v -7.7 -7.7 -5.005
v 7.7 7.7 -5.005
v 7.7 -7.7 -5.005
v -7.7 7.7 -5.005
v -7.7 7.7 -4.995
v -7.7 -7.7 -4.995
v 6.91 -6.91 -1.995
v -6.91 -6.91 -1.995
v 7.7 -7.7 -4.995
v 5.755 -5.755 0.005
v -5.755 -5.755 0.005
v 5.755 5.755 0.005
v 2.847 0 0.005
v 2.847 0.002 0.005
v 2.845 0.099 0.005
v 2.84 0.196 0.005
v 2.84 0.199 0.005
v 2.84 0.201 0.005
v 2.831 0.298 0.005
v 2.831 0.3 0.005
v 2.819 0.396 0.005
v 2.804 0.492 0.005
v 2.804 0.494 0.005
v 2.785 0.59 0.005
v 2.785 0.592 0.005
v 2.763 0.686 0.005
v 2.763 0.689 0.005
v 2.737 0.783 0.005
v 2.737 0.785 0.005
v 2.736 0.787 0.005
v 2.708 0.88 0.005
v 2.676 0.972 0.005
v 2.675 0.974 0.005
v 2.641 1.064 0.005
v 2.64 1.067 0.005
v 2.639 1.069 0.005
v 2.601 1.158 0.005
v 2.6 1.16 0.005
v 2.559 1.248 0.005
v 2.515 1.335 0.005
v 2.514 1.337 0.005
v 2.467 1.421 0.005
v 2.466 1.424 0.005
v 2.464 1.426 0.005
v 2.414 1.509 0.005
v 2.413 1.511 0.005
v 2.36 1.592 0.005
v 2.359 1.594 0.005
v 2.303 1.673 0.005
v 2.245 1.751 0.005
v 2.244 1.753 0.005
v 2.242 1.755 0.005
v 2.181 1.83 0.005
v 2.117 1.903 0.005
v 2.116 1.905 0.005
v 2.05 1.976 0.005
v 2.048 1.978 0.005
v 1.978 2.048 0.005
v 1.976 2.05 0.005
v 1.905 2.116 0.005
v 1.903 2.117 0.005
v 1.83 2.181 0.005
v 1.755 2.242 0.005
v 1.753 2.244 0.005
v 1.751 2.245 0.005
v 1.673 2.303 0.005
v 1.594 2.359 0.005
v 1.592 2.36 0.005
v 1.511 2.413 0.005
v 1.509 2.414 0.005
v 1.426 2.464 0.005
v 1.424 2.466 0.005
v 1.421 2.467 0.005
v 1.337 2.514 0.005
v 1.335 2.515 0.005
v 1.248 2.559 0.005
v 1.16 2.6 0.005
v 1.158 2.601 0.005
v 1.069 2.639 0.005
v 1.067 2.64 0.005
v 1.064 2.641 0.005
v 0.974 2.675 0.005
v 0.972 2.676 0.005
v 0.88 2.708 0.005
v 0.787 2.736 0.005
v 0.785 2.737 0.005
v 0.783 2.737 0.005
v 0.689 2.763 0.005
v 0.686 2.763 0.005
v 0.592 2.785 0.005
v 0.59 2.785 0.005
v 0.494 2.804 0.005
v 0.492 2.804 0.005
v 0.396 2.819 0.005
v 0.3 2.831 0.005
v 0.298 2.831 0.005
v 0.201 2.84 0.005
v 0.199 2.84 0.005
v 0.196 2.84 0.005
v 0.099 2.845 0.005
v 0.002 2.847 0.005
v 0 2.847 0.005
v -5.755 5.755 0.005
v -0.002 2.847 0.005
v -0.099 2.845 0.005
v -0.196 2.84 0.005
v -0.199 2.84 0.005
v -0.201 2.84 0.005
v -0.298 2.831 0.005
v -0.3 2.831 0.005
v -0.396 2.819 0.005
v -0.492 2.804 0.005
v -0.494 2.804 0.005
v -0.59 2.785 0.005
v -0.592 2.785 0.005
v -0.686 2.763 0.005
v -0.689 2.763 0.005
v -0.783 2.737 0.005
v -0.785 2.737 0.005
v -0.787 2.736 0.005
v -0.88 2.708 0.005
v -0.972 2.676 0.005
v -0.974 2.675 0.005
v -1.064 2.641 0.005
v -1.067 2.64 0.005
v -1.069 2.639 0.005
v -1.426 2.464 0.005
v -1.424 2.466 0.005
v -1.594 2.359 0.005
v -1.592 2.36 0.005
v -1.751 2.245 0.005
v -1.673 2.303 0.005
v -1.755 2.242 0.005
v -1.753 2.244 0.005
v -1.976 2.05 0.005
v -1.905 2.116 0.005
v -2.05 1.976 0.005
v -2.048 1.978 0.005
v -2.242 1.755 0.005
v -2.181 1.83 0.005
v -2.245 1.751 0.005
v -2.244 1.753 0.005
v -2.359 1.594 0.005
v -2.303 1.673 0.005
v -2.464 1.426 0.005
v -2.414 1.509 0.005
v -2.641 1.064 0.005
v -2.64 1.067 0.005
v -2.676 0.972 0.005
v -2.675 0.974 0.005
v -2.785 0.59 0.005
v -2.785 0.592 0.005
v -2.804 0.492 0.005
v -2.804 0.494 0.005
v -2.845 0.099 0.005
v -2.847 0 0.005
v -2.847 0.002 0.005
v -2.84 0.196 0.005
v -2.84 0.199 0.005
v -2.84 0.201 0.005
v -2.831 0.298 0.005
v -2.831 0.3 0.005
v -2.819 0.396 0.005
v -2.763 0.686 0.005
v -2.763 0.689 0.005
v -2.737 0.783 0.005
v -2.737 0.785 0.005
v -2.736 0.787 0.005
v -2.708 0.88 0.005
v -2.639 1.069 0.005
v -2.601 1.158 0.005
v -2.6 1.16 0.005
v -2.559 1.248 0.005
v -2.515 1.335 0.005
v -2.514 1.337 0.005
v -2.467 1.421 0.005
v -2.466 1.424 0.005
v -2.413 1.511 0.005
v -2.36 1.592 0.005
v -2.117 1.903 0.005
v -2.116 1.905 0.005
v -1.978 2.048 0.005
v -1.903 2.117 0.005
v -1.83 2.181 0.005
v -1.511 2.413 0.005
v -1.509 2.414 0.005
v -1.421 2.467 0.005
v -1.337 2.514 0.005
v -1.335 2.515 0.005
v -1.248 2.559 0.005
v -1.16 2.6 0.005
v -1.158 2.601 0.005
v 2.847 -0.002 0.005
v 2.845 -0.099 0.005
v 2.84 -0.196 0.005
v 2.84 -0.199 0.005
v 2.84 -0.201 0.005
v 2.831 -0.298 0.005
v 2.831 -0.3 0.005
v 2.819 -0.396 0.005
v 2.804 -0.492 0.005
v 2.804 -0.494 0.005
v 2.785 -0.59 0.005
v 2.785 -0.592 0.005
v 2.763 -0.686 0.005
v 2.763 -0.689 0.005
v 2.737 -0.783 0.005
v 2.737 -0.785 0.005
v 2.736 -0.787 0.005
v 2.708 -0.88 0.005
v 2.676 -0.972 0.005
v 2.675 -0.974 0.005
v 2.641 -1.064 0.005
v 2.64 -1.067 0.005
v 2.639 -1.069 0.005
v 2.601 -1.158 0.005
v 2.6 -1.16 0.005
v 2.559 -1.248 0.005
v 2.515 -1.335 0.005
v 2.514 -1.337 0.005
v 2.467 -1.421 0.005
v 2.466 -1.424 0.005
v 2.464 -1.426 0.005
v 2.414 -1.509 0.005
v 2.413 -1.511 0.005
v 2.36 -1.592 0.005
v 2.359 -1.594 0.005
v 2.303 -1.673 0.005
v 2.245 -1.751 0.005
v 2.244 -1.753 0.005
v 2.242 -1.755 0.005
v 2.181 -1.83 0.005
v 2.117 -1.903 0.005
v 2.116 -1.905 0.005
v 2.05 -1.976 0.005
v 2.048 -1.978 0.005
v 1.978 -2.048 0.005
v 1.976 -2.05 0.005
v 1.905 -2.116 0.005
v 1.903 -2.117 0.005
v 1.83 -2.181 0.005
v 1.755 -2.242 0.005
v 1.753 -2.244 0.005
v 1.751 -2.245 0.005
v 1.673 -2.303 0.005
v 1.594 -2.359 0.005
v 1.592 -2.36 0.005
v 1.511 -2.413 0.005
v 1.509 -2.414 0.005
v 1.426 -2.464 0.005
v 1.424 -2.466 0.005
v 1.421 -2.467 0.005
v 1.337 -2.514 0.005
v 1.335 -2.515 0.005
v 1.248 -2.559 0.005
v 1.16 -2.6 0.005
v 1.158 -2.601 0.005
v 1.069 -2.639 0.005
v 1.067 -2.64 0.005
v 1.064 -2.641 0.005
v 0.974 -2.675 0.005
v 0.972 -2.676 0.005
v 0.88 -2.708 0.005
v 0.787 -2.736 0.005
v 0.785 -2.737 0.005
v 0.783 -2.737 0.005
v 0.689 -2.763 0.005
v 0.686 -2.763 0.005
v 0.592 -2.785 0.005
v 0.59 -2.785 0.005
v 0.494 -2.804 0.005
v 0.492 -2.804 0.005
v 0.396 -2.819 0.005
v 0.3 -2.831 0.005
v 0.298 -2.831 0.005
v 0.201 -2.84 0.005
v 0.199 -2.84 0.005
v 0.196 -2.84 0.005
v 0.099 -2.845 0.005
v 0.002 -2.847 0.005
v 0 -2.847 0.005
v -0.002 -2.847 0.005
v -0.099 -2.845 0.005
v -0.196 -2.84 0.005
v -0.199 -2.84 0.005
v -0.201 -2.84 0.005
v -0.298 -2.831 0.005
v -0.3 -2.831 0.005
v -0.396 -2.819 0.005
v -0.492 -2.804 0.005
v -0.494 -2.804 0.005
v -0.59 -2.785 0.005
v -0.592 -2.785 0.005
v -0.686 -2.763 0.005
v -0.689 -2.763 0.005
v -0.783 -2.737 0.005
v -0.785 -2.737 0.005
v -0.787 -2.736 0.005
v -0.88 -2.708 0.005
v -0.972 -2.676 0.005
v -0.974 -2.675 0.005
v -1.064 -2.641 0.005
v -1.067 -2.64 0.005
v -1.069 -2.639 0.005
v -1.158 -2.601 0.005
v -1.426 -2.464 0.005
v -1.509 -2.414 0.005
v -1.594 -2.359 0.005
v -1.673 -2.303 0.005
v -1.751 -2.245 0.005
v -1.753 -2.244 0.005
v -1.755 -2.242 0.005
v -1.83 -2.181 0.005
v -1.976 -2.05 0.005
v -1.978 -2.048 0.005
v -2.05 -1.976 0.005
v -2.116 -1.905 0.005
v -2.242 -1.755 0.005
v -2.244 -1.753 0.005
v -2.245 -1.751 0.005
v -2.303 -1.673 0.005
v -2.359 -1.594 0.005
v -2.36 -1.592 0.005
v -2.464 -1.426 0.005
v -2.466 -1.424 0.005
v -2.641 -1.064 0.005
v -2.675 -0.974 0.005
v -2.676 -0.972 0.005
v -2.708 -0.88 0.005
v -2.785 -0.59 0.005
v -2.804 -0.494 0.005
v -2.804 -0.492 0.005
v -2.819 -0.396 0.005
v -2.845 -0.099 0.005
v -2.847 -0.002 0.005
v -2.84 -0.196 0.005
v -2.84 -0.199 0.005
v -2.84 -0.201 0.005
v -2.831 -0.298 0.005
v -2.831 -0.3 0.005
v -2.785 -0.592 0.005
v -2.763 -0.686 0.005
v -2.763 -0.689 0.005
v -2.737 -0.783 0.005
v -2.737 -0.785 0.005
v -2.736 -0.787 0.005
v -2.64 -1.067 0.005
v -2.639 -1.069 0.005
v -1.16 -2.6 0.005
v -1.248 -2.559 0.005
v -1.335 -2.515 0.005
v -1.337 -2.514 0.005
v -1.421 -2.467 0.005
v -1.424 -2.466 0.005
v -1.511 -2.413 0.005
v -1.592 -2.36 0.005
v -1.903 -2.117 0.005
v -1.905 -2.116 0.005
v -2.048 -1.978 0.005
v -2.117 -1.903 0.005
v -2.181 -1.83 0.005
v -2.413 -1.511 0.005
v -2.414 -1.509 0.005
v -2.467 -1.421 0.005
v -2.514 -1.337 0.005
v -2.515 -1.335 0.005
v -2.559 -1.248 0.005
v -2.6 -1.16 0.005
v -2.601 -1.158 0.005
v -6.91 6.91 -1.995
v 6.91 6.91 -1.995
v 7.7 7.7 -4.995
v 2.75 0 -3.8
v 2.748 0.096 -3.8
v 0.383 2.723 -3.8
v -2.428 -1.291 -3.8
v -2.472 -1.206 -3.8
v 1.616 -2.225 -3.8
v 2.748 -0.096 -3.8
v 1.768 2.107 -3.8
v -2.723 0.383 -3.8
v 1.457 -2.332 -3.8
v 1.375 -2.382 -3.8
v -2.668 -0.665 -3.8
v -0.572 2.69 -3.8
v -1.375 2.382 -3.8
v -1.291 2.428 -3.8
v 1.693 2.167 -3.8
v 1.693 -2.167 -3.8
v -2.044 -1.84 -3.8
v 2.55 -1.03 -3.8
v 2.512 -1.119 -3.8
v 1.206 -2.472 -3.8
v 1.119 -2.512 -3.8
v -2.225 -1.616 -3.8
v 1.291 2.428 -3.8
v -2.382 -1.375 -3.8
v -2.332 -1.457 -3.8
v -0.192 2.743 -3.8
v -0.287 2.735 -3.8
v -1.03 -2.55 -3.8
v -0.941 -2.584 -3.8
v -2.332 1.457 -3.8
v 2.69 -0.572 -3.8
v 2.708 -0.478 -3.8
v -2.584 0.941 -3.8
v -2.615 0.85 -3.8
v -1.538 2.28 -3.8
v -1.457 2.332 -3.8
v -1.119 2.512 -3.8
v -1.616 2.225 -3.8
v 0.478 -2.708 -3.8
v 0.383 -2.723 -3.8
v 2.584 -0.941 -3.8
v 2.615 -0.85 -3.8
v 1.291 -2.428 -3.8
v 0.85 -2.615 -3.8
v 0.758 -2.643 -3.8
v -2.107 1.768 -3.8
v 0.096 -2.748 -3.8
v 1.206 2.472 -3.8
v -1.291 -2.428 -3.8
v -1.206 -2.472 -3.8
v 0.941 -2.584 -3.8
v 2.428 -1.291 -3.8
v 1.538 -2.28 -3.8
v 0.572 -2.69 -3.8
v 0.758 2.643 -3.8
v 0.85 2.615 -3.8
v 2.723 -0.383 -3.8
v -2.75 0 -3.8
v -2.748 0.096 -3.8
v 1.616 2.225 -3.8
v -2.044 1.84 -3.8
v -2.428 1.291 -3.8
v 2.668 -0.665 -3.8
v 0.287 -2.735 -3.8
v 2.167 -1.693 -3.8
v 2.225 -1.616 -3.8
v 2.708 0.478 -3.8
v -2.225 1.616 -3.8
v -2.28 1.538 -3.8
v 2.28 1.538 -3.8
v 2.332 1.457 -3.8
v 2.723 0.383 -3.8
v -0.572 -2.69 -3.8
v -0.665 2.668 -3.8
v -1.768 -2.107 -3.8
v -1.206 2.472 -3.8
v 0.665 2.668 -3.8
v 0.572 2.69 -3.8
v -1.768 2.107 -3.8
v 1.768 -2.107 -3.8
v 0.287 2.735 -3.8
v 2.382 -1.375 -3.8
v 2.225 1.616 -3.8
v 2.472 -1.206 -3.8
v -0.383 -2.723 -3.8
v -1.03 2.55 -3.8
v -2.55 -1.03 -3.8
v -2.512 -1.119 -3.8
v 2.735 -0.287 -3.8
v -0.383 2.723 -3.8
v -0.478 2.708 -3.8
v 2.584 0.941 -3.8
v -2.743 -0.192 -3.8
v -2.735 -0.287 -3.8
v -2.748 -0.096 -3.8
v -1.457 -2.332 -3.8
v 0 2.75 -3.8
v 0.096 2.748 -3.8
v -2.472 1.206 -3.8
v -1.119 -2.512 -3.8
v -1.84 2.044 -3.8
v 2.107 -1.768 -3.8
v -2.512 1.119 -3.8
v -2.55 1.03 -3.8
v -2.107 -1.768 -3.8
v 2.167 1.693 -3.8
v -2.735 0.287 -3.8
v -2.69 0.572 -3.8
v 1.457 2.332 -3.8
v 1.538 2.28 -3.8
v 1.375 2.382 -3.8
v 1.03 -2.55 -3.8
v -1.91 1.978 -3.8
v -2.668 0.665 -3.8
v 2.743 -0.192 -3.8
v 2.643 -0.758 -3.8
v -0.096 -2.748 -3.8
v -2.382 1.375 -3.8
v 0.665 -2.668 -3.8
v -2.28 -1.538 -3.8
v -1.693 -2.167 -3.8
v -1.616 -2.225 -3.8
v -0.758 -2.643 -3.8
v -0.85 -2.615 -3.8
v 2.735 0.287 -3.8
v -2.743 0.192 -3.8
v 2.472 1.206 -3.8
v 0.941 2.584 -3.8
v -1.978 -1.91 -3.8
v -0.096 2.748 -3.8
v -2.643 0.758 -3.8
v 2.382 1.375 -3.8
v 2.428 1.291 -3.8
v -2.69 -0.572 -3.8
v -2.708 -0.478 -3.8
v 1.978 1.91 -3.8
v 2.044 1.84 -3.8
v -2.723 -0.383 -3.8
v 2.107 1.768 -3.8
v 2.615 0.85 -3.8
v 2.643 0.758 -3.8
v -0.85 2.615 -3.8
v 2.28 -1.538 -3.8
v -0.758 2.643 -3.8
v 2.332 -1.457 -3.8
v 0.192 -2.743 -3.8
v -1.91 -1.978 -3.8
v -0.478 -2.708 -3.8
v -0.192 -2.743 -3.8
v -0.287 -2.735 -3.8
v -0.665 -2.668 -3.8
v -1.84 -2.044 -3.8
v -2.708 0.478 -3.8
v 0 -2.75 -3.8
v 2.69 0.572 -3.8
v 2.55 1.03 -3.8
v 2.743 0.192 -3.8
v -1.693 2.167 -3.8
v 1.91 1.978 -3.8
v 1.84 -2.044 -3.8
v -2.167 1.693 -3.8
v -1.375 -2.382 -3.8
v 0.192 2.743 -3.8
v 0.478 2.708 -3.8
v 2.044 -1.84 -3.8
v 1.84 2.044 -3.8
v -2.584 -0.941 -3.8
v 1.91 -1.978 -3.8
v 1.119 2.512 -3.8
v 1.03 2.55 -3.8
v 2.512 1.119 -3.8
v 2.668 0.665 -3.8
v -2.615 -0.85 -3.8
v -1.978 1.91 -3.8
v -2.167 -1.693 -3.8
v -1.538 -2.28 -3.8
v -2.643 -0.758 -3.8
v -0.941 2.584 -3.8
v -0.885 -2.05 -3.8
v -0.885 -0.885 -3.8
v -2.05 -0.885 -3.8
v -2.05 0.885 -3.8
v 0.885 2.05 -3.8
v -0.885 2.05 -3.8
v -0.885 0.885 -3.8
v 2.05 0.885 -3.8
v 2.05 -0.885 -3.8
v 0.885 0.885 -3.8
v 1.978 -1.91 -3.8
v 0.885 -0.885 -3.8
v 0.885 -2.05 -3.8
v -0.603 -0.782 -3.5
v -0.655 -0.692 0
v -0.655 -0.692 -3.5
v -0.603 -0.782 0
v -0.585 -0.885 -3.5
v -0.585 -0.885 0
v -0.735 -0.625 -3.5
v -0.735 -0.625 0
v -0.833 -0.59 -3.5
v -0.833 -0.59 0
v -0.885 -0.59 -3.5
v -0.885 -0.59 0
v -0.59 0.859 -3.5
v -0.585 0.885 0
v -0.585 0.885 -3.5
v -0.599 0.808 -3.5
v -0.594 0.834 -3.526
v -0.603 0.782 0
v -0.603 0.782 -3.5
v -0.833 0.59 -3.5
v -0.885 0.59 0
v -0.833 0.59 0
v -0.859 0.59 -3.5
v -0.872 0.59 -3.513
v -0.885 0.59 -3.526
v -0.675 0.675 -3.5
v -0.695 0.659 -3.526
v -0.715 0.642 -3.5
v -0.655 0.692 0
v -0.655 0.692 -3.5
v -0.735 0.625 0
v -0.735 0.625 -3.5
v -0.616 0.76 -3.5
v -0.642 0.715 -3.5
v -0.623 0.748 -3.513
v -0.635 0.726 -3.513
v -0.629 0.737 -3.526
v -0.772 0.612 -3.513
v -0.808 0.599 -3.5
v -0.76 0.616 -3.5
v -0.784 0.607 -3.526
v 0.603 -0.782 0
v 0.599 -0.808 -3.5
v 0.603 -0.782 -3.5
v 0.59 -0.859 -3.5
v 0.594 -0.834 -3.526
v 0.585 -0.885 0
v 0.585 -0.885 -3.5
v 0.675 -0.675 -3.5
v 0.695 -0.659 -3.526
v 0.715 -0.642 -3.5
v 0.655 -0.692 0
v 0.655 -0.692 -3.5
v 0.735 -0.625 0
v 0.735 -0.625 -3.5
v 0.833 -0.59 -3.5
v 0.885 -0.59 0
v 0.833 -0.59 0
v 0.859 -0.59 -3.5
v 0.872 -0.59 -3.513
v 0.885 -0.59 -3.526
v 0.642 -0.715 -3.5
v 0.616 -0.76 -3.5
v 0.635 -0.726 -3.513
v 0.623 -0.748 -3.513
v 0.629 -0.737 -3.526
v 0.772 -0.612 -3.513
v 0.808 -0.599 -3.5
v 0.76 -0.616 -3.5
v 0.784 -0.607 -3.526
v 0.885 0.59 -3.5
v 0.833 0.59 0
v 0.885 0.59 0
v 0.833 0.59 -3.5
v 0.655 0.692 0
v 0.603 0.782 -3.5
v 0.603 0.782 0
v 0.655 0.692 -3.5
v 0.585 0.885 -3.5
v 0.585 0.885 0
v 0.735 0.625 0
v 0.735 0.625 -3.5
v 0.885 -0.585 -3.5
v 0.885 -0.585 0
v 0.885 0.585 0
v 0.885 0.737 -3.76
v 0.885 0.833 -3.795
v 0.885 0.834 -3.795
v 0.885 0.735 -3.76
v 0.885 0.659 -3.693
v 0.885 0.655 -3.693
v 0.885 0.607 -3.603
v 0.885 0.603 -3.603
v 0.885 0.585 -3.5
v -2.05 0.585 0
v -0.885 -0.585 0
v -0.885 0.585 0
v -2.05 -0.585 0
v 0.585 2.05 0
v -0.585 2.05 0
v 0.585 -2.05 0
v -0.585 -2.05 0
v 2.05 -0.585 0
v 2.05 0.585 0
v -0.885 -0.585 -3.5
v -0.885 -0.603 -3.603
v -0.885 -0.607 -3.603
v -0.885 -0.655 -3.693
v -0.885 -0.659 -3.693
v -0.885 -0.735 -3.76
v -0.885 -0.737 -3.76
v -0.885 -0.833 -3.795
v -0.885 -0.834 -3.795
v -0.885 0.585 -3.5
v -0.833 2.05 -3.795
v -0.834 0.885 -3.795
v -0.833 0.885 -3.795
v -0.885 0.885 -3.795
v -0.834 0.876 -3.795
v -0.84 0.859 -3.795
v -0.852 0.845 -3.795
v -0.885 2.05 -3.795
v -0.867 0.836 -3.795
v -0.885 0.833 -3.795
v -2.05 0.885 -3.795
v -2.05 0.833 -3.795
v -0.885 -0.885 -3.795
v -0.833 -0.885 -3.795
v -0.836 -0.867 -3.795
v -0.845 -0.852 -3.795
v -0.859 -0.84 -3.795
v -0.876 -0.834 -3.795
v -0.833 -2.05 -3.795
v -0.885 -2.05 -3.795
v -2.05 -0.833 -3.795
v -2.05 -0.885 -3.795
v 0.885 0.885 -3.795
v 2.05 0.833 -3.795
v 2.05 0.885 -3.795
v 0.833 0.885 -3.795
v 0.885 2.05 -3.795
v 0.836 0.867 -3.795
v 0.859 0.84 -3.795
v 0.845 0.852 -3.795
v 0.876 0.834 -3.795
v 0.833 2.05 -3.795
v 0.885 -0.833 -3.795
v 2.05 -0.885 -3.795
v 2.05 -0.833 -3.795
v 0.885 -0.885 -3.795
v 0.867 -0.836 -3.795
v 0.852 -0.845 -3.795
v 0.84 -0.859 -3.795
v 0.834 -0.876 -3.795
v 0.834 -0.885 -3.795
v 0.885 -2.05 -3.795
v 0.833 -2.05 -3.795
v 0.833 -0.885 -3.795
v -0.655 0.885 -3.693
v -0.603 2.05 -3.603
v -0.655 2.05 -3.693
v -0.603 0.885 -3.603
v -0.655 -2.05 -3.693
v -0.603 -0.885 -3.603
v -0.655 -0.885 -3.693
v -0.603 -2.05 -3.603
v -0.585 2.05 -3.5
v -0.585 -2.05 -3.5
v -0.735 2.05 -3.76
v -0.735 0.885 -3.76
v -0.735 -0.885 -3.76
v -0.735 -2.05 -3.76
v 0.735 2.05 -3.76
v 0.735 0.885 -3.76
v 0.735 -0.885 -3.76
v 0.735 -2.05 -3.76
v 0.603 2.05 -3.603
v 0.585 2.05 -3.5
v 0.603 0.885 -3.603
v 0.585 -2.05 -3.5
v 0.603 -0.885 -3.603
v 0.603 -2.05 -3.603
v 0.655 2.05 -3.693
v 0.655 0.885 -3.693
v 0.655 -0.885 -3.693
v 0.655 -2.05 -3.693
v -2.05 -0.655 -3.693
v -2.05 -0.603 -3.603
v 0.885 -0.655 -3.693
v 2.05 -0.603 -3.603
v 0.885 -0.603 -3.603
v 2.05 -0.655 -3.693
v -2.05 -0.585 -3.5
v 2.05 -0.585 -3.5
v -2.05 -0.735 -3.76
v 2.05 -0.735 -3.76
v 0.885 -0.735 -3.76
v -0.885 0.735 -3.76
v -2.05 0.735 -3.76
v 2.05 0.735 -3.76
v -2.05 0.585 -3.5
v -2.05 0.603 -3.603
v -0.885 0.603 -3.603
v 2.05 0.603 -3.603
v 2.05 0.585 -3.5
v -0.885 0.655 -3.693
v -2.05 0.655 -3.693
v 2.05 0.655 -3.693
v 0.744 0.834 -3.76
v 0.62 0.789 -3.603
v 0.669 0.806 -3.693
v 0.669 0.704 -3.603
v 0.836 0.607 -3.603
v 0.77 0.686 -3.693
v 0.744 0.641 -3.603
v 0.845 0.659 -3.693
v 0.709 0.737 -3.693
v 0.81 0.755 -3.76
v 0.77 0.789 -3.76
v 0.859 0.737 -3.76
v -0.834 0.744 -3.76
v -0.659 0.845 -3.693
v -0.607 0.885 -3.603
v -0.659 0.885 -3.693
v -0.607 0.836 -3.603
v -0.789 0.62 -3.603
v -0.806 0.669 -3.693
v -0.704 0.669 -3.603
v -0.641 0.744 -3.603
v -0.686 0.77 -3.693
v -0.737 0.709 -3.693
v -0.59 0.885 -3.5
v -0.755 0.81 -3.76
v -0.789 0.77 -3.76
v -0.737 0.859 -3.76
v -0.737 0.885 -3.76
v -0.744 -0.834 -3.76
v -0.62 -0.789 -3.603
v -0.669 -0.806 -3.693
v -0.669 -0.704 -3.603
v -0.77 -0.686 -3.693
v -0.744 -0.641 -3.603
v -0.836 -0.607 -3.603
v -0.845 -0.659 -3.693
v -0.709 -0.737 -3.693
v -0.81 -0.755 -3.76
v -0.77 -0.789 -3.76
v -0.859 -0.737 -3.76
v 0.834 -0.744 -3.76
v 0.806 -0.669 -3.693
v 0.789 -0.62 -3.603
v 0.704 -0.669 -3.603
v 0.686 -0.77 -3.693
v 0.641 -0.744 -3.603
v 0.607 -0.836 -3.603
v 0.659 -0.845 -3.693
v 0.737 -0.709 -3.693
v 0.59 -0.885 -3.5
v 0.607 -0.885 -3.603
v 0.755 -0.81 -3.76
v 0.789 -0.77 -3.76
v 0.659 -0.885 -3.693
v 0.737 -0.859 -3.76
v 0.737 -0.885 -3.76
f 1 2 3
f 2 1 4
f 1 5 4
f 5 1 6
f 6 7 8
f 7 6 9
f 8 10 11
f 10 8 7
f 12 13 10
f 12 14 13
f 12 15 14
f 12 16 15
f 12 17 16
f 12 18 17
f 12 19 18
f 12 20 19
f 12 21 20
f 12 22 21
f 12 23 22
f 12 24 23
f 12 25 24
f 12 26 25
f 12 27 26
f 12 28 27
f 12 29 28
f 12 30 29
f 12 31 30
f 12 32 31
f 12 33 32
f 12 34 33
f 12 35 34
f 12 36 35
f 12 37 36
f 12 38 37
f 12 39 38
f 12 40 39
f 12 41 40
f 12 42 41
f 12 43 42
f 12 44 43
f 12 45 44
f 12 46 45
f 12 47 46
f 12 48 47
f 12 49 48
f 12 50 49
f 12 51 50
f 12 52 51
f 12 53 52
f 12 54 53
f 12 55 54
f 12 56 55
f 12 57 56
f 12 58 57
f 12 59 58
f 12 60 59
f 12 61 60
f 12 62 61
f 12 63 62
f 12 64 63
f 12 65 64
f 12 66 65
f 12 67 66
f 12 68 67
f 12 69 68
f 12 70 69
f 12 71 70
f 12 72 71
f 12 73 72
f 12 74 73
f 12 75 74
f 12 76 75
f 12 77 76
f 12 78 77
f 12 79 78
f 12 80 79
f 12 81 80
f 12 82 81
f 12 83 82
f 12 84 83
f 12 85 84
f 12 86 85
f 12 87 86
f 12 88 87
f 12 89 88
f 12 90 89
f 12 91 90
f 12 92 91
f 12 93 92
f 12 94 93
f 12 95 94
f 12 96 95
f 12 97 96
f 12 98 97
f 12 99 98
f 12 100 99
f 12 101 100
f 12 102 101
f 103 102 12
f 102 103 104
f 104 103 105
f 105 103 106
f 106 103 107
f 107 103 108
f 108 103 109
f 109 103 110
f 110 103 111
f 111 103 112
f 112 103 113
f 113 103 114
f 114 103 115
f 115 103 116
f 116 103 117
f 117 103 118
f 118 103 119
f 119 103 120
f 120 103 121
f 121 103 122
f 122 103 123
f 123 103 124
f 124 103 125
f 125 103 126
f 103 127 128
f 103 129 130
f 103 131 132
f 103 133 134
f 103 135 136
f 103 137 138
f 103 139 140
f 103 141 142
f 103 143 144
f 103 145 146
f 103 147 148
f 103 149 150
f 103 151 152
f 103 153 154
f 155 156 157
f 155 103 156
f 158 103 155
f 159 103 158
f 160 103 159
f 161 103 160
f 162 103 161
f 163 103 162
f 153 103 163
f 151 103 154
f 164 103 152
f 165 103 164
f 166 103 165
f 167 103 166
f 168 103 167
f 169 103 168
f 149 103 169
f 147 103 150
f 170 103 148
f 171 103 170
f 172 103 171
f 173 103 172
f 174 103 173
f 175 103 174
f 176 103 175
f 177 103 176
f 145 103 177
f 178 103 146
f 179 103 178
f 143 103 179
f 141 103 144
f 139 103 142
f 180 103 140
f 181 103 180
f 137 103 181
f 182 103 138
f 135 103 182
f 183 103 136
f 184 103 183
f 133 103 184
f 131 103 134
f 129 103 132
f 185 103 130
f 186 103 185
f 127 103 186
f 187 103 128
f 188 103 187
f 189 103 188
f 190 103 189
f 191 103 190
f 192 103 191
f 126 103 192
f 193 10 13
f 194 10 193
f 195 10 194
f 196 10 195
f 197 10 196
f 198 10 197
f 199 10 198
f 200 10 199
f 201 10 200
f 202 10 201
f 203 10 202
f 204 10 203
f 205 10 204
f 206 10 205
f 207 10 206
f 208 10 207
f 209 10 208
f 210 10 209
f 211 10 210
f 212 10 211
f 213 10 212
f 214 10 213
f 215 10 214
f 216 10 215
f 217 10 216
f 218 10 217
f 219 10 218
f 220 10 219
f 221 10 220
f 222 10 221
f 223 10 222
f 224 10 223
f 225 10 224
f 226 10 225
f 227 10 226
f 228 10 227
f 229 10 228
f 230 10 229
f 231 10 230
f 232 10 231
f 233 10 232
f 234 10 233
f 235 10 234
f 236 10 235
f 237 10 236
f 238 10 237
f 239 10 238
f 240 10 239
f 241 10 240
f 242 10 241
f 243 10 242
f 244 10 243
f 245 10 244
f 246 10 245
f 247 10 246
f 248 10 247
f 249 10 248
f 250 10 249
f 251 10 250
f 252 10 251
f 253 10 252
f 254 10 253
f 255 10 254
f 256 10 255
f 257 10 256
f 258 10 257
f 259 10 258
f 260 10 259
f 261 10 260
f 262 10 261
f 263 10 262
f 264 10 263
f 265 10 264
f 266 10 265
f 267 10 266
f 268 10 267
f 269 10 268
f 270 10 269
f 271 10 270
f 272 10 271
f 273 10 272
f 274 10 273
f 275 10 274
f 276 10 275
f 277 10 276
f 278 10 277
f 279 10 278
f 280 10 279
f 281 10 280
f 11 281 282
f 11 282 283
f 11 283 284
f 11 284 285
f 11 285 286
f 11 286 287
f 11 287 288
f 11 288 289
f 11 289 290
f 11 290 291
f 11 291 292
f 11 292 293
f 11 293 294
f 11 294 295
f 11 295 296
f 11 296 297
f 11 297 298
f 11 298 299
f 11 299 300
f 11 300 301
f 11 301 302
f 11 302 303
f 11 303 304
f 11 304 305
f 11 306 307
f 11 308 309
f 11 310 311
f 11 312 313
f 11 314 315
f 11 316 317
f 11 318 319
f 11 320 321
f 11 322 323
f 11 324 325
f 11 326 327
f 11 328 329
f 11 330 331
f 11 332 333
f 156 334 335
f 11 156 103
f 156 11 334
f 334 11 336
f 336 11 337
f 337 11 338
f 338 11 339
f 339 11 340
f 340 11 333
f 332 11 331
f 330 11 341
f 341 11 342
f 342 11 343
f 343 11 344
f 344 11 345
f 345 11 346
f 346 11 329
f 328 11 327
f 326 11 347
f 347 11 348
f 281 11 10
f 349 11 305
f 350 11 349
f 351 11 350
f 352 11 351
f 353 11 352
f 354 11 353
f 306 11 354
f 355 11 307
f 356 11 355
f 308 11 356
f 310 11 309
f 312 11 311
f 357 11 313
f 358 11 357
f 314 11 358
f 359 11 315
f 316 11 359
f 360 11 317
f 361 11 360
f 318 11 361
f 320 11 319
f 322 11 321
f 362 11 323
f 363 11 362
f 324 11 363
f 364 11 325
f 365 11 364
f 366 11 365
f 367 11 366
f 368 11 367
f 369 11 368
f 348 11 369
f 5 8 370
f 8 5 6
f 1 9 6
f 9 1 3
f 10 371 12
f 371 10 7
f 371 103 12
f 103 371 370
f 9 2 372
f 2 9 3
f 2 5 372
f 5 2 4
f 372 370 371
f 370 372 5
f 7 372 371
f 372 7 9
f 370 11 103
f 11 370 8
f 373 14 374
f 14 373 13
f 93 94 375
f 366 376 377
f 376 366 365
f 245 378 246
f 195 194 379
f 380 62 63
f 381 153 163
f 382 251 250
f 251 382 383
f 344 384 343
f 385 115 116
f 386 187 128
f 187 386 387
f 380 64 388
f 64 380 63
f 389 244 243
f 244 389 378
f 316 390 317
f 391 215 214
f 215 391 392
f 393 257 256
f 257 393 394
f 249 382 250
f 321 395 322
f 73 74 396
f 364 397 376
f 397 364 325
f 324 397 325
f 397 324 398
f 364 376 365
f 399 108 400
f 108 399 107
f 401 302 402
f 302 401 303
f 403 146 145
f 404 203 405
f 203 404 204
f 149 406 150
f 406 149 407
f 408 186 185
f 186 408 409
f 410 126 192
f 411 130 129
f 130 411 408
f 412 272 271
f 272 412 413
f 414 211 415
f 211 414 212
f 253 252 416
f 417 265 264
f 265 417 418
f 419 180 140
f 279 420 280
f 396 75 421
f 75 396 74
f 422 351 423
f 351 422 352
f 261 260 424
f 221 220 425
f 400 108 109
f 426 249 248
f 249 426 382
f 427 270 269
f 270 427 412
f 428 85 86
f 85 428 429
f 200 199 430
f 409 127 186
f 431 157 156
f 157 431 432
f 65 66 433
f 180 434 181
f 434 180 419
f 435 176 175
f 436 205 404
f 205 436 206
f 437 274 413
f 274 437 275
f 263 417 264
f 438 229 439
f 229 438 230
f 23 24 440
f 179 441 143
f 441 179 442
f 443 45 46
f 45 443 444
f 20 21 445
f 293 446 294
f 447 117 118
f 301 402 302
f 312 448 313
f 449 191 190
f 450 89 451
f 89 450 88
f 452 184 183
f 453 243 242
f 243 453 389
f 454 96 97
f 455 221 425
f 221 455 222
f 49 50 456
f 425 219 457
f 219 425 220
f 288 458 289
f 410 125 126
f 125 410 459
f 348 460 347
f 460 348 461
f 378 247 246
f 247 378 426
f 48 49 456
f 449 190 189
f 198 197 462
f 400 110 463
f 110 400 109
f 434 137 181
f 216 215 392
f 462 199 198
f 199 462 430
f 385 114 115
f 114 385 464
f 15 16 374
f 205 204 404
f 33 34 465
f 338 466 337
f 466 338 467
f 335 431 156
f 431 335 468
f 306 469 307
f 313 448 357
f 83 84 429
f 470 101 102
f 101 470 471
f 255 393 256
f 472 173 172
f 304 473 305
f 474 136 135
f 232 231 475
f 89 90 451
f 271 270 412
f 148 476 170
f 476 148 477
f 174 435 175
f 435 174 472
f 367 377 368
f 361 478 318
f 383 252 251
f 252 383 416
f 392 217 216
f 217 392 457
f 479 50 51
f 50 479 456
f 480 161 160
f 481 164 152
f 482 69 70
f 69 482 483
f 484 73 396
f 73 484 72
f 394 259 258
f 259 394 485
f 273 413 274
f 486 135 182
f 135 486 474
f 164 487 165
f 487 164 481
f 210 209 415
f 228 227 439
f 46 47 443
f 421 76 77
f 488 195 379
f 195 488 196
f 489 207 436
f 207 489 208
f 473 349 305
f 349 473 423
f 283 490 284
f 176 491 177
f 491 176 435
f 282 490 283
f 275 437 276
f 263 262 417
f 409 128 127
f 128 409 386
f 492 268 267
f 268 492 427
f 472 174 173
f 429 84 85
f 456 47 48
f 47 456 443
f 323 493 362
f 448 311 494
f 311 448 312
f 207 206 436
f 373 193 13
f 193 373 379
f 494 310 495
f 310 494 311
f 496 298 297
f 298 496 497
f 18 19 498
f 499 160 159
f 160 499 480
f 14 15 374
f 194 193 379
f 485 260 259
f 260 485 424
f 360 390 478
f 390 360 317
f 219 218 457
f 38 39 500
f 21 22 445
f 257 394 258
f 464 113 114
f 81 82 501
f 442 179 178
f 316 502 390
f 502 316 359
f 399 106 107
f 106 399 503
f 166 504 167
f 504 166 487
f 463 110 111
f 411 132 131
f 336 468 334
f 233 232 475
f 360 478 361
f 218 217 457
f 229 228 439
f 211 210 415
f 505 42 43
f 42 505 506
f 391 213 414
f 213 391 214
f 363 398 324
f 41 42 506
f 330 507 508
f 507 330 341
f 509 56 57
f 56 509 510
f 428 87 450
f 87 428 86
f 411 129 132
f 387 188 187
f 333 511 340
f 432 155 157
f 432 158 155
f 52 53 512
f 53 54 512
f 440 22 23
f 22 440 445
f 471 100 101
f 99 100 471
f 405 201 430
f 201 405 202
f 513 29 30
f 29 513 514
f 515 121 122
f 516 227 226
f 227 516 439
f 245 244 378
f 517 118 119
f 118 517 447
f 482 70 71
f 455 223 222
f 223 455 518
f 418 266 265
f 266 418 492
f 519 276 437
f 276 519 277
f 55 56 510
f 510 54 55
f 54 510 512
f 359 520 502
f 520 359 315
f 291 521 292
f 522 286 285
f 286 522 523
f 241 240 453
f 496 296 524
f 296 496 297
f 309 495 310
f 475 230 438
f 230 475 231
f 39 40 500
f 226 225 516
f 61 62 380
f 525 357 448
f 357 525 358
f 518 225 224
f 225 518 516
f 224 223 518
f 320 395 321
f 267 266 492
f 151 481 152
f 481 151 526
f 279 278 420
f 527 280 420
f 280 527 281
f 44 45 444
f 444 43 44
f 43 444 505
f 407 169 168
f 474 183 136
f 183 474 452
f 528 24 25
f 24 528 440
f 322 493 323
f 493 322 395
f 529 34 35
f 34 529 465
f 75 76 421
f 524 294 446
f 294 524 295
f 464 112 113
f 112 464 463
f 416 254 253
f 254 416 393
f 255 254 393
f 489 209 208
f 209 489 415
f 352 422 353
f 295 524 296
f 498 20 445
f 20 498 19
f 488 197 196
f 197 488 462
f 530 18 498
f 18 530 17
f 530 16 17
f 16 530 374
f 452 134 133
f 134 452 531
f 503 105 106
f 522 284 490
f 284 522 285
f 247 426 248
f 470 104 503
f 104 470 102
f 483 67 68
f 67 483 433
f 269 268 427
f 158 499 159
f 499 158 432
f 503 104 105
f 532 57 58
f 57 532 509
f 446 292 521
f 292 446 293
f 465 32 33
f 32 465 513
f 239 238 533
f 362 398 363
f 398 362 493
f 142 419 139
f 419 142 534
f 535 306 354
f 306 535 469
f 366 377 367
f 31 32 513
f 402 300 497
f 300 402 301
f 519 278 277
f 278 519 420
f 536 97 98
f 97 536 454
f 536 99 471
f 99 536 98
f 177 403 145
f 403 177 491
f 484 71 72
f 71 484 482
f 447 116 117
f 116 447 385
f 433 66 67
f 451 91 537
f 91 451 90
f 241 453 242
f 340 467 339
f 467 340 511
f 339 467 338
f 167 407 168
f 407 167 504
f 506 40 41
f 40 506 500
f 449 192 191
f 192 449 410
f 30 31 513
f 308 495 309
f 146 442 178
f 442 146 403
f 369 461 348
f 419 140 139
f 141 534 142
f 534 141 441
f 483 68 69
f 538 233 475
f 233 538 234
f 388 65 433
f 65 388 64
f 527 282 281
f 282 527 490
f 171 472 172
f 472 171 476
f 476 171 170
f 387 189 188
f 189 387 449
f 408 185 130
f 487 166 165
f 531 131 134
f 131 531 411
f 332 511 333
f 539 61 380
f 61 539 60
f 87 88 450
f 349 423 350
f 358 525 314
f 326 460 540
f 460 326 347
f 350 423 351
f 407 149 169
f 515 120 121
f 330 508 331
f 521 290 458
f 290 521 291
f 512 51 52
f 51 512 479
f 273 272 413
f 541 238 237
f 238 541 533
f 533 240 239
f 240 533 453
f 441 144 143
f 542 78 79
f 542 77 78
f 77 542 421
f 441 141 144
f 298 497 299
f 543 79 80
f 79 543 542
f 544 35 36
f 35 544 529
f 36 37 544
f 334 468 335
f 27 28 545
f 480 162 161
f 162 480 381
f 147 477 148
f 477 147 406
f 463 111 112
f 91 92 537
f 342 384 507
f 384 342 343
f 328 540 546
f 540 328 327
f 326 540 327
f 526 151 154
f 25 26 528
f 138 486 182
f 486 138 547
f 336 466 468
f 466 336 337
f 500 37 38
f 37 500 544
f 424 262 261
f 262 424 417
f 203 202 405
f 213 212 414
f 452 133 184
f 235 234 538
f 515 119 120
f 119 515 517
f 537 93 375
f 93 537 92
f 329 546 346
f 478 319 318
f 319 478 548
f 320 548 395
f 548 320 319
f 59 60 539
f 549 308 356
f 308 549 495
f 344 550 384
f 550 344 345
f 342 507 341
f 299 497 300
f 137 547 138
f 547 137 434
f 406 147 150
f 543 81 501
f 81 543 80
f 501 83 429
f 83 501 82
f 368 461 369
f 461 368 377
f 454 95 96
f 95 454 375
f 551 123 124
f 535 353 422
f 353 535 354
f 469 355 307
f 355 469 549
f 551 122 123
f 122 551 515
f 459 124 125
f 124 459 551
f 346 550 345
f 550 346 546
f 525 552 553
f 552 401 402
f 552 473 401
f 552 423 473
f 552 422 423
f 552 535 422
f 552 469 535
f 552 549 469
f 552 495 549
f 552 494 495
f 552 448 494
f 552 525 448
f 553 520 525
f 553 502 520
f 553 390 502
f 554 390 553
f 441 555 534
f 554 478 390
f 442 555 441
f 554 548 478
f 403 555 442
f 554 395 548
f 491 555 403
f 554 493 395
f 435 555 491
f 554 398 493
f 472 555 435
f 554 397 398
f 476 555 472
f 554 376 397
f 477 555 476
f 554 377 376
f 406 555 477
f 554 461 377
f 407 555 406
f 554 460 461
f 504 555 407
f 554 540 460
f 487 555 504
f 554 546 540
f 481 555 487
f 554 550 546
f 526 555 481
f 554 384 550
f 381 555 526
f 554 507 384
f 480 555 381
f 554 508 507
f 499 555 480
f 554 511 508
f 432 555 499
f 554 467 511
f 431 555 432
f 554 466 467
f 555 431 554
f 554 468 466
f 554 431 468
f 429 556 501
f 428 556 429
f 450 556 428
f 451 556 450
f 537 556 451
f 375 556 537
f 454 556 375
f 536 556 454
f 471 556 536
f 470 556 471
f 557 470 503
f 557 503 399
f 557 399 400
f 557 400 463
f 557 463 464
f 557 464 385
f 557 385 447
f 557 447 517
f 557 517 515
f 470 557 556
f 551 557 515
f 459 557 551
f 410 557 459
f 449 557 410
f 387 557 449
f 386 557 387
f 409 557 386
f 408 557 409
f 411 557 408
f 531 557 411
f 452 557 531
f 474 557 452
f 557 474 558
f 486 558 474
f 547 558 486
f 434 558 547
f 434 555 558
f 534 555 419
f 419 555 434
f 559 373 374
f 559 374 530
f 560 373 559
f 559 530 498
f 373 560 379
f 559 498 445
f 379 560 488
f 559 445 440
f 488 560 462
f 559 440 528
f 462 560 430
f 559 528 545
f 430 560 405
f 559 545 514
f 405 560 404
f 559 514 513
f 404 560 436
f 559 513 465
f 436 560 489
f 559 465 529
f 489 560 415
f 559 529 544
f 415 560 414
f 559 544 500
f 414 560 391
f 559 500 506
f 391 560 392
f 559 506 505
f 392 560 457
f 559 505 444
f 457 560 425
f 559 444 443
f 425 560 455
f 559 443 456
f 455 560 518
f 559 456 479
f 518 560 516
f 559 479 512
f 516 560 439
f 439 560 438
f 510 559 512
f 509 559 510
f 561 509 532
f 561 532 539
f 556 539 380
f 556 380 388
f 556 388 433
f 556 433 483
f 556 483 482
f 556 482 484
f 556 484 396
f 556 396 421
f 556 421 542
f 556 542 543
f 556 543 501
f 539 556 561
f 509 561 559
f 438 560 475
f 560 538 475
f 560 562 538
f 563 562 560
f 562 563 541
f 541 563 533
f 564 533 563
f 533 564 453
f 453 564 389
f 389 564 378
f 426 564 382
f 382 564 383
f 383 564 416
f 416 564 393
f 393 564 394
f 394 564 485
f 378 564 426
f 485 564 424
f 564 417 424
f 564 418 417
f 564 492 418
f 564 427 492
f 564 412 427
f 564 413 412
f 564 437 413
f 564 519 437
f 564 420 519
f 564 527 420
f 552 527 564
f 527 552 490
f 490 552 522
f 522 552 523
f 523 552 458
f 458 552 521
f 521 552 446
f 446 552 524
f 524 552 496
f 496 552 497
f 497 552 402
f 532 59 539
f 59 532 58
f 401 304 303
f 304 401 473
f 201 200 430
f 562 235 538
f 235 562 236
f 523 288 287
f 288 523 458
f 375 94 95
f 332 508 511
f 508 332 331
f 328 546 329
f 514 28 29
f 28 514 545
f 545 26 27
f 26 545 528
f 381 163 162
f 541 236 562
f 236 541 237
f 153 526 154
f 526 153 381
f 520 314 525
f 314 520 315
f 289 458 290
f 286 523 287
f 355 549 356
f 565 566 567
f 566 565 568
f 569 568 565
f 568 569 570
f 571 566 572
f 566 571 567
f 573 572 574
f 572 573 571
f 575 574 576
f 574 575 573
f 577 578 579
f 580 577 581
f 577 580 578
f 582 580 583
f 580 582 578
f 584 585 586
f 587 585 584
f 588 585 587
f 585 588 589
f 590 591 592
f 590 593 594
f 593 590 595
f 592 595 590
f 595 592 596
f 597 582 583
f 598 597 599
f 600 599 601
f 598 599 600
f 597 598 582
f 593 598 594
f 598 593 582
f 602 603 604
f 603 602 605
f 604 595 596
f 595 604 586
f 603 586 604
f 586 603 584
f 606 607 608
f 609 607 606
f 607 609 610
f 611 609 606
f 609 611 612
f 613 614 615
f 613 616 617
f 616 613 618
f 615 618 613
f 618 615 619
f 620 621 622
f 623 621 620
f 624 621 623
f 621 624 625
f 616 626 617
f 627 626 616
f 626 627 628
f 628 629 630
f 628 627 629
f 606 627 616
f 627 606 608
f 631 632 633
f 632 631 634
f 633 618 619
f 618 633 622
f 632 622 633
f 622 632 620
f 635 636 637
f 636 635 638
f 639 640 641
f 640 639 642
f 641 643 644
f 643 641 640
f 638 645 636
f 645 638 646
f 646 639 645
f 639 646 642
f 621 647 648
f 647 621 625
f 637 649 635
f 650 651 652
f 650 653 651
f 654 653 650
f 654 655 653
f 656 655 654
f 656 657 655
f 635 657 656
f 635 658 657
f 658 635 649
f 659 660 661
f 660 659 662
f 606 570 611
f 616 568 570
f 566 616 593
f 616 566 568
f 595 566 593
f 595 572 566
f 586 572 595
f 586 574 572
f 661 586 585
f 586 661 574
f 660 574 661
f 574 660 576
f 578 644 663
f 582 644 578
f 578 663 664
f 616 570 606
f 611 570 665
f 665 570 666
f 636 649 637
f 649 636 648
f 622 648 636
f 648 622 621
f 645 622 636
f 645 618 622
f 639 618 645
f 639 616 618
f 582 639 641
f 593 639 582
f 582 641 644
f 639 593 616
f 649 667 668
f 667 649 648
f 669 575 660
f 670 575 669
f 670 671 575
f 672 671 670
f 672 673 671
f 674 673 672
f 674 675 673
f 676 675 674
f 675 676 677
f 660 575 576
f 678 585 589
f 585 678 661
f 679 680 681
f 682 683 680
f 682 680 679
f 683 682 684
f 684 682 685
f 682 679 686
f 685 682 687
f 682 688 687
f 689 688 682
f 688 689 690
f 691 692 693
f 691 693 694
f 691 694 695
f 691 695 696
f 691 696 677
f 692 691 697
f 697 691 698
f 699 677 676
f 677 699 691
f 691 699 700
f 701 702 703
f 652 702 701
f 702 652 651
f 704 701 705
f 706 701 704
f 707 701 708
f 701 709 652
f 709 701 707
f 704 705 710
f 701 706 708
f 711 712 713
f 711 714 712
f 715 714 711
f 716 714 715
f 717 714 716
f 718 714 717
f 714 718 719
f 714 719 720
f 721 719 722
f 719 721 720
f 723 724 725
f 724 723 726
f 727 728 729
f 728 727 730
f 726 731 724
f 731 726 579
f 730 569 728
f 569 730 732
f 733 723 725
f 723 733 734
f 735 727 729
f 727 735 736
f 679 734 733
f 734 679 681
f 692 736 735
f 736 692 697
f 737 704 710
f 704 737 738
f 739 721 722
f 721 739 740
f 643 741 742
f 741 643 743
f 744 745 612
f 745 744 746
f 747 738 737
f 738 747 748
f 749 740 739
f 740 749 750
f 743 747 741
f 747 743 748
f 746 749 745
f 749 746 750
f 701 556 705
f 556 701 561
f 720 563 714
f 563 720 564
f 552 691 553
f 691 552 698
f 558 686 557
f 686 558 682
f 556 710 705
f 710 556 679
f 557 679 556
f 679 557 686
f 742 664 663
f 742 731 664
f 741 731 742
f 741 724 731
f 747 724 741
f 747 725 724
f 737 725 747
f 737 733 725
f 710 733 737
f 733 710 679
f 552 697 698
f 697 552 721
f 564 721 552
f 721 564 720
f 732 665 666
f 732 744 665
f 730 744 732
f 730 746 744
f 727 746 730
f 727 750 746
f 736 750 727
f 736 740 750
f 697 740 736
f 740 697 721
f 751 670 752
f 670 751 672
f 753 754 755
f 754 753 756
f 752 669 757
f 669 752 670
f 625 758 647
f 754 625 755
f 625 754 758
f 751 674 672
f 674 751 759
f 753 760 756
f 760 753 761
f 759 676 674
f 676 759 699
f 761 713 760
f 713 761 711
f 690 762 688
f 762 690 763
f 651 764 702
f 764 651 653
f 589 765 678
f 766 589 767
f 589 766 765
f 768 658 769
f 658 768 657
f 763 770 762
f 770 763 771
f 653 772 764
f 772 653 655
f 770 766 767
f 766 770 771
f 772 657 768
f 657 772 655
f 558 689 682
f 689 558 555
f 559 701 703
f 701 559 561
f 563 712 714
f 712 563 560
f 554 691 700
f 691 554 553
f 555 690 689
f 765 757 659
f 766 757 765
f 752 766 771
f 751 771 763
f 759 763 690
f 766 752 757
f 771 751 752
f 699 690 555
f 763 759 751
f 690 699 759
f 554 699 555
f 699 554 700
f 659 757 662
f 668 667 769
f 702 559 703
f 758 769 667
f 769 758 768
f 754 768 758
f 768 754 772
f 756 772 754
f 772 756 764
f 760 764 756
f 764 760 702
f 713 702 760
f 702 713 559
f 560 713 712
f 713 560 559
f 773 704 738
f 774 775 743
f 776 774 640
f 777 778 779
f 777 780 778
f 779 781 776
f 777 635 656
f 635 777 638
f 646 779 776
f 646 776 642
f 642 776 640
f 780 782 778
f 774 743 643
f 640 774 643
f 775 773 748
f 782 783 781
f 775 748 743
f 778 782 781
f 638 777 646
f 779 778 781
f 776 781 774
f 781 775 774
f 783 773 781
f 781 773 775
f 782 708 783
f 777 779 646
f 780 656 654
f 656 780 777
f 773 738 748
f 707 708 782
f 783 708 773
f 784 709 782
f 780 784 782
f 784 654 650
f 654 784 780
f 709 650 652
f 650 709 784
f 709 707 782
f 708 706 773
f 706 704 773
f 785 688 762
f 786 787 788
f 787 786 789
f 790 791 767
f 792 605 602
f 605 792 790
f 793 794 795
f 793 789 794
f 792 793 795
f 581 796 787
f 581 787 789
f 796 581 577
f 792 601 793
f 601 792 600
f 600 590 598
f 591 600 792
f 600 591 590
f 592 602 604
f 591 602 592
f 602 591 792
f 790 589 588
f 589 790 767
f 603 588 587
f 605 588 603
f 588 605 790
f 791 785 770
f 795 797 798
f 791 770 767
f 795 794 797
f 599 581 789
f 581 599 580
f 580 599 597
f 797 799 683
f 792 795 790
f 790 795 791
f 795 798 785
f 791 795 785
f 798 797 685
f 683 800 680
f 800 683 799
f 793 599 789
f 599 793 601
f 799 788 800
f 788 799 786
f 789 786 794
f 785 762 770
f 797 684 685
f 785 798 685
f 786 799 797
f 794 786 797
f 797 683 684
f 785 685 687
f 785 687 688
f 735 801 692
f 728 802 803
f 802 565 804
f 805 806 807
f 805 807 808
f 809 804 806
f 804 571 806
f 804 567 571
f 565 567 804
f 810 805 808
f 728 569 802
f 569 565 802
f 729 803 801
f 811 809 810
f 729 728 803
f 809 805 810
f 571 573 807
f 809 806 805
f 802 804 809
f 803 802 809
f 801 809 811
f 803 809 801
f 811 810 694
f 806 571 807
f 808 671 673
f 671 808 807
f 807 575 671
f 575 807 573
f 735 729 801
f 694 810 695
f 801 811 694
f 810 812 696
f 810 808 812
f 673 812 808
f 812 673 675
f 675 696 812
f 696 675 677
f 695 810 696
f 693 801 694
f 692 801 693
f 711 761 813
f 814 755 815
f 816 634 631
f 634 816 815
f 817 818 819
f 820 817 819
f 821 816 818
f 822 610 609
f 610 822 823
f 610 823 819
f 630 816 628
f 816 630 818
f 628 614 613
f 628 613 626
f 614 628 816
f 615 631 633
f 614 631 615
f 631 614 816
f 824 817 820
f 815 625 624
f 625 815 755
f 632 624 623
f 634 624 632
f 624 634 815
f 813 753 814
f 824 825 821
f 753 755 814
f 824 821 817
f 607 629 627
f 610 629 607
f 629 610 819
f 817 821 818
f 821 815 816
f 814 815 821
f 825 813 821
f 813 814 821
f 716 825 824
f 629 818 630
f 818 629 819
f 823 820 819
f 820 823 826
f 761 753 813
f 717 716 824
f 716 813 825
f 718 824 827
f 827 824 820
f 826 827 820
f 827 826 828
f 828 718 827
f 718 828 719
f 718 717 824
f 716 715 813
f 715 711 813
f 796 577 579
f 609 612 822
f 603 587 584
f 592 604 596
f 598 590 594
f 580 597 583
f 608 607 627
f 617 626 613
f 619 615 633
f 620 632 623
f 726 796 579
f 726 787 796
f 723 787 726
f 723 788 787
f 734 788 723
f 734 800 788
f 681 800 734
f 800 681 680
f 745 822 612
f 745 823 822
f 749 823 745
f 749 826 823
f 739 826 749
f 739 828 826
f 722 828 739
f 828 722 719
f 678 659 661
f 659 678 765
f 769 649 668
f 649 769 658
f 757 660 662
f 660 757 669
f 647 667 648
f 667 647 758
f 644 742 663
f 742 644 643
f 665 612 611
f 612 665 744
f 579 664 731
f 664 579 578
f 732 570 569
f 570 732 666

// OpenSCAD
/*
This module is meant to be used in a difference,
and will both subtract the dimensions of the keyswitch
and enforce the separation between keycaps

data from https://www.cherrymx.de/en/dev.html
 */
$fa=.01;
$fs=.1;
cross_width=4.1; //[4.1:4.15]
cross_thickness=1.17; //[1.15:1.19]
cross_roundover_r = 0.3; // exact
cross_depth_min = 3.8; //switch is only 3.6 so they want gap
stem_d = 5.5; // TODO: split stem outer shape in three options: maximum, maximum kalih box
stem_h_min = cross_depth_min;
keyhole_xy = 15.4;
keyhole_taper1 = 7.5;
keyhole_taper2 = 30;
keyhole_midheight_min = 3;
keyhole_h_max = 5;
//keycap_spacing = 19.05;
keycap_w = 18;

module keycap_negative(){
    stem_round();
}
module keycap_bounds(w=keycap_w){
    translate([-key_spacing/2,-key_spacing/2,-keyhole_h_max]) cube([key_spacing,key_spacing,20]);
}

module stem_cross(h=cross_depth_min, w=cross_width, t=cross_thickness, r=cross_roundover_r){
    //sticks up from [0,0,0] with .01 below the xy plane to adhere to the balls
    translate([0,0,h/2]) cube([w,t,h], center=true);
    translate([0,0,h/2]) cube([t,w,h], center=true);
    difference(){
        translate([0,0,h/2]) cube([t+2*r,t+2*r,h], center=true);
        for(i=[-1,1],j=[-1,1]) translate([i*(r+t/2),j*(r+t/2),-.01]) cylinder(h=h+.02,r=r,$fn=max(2*PI*r/$fs,12));
    }
    for(a=[0,90]) rotate([0,0,a])difference(){
        translate([-t/2-r,-w/2,-.01]) cube([t+2*r,w,r+.01]);
        for(dx=[-t/2-r,t/2+r]) translate([dx,0,r]) rotate([90,0,0]) cylinder(h=w+.02,r=r, center=true,$fn=max(2*PI*r/$fs,12));
    }
    difference(){
        translate([-t/2-r,-t/2-r,0]) cube([t+2*r,t+2*r,r]);
        for(a=[0,90,180,270]) rotate([0,0,a]) translate([t/2+r,t/2+r,r]) sphere(r,$fn=max(2*PI*r/$fs,12));
    }
}

module housing_clearance(h1=keyhole_midheight_min, h2=keyhole_h_max, w=keyhole_xy, taper1=keyhole_taper1, taper2=keyhole_taper2){
    // spec clearing for a keycap_negative
    // glued to the bottom of the xy plane
    translate([0,0,-h2]) hull()
    {
        cube([w,w,.01], center=true);
        midwidth = w - 2*h1*2*tan(taper1);
        translate([0,0,h1]) cube([midwidth,midwidth,.01], center=true);
        top_width = midwidth - 2 * (h2-h1)*tan(taper2);
        translate([0,0,h2]) cube([top_width,top_width,.01], center=true);
    }
}

module stem_round(h = stem_h_min, d1=stem_d, taper=1.5, w = keyhole_xy){
    difference(){
        housing_clearance();
        translate([0,0,-h]) cylinder(h=h+.1,d1=stem_d, d2=stem_d+2*stem_h_min*tan(taper));
    }
    translate([0,0,-h]) stem_cross();

}

stem_round();
